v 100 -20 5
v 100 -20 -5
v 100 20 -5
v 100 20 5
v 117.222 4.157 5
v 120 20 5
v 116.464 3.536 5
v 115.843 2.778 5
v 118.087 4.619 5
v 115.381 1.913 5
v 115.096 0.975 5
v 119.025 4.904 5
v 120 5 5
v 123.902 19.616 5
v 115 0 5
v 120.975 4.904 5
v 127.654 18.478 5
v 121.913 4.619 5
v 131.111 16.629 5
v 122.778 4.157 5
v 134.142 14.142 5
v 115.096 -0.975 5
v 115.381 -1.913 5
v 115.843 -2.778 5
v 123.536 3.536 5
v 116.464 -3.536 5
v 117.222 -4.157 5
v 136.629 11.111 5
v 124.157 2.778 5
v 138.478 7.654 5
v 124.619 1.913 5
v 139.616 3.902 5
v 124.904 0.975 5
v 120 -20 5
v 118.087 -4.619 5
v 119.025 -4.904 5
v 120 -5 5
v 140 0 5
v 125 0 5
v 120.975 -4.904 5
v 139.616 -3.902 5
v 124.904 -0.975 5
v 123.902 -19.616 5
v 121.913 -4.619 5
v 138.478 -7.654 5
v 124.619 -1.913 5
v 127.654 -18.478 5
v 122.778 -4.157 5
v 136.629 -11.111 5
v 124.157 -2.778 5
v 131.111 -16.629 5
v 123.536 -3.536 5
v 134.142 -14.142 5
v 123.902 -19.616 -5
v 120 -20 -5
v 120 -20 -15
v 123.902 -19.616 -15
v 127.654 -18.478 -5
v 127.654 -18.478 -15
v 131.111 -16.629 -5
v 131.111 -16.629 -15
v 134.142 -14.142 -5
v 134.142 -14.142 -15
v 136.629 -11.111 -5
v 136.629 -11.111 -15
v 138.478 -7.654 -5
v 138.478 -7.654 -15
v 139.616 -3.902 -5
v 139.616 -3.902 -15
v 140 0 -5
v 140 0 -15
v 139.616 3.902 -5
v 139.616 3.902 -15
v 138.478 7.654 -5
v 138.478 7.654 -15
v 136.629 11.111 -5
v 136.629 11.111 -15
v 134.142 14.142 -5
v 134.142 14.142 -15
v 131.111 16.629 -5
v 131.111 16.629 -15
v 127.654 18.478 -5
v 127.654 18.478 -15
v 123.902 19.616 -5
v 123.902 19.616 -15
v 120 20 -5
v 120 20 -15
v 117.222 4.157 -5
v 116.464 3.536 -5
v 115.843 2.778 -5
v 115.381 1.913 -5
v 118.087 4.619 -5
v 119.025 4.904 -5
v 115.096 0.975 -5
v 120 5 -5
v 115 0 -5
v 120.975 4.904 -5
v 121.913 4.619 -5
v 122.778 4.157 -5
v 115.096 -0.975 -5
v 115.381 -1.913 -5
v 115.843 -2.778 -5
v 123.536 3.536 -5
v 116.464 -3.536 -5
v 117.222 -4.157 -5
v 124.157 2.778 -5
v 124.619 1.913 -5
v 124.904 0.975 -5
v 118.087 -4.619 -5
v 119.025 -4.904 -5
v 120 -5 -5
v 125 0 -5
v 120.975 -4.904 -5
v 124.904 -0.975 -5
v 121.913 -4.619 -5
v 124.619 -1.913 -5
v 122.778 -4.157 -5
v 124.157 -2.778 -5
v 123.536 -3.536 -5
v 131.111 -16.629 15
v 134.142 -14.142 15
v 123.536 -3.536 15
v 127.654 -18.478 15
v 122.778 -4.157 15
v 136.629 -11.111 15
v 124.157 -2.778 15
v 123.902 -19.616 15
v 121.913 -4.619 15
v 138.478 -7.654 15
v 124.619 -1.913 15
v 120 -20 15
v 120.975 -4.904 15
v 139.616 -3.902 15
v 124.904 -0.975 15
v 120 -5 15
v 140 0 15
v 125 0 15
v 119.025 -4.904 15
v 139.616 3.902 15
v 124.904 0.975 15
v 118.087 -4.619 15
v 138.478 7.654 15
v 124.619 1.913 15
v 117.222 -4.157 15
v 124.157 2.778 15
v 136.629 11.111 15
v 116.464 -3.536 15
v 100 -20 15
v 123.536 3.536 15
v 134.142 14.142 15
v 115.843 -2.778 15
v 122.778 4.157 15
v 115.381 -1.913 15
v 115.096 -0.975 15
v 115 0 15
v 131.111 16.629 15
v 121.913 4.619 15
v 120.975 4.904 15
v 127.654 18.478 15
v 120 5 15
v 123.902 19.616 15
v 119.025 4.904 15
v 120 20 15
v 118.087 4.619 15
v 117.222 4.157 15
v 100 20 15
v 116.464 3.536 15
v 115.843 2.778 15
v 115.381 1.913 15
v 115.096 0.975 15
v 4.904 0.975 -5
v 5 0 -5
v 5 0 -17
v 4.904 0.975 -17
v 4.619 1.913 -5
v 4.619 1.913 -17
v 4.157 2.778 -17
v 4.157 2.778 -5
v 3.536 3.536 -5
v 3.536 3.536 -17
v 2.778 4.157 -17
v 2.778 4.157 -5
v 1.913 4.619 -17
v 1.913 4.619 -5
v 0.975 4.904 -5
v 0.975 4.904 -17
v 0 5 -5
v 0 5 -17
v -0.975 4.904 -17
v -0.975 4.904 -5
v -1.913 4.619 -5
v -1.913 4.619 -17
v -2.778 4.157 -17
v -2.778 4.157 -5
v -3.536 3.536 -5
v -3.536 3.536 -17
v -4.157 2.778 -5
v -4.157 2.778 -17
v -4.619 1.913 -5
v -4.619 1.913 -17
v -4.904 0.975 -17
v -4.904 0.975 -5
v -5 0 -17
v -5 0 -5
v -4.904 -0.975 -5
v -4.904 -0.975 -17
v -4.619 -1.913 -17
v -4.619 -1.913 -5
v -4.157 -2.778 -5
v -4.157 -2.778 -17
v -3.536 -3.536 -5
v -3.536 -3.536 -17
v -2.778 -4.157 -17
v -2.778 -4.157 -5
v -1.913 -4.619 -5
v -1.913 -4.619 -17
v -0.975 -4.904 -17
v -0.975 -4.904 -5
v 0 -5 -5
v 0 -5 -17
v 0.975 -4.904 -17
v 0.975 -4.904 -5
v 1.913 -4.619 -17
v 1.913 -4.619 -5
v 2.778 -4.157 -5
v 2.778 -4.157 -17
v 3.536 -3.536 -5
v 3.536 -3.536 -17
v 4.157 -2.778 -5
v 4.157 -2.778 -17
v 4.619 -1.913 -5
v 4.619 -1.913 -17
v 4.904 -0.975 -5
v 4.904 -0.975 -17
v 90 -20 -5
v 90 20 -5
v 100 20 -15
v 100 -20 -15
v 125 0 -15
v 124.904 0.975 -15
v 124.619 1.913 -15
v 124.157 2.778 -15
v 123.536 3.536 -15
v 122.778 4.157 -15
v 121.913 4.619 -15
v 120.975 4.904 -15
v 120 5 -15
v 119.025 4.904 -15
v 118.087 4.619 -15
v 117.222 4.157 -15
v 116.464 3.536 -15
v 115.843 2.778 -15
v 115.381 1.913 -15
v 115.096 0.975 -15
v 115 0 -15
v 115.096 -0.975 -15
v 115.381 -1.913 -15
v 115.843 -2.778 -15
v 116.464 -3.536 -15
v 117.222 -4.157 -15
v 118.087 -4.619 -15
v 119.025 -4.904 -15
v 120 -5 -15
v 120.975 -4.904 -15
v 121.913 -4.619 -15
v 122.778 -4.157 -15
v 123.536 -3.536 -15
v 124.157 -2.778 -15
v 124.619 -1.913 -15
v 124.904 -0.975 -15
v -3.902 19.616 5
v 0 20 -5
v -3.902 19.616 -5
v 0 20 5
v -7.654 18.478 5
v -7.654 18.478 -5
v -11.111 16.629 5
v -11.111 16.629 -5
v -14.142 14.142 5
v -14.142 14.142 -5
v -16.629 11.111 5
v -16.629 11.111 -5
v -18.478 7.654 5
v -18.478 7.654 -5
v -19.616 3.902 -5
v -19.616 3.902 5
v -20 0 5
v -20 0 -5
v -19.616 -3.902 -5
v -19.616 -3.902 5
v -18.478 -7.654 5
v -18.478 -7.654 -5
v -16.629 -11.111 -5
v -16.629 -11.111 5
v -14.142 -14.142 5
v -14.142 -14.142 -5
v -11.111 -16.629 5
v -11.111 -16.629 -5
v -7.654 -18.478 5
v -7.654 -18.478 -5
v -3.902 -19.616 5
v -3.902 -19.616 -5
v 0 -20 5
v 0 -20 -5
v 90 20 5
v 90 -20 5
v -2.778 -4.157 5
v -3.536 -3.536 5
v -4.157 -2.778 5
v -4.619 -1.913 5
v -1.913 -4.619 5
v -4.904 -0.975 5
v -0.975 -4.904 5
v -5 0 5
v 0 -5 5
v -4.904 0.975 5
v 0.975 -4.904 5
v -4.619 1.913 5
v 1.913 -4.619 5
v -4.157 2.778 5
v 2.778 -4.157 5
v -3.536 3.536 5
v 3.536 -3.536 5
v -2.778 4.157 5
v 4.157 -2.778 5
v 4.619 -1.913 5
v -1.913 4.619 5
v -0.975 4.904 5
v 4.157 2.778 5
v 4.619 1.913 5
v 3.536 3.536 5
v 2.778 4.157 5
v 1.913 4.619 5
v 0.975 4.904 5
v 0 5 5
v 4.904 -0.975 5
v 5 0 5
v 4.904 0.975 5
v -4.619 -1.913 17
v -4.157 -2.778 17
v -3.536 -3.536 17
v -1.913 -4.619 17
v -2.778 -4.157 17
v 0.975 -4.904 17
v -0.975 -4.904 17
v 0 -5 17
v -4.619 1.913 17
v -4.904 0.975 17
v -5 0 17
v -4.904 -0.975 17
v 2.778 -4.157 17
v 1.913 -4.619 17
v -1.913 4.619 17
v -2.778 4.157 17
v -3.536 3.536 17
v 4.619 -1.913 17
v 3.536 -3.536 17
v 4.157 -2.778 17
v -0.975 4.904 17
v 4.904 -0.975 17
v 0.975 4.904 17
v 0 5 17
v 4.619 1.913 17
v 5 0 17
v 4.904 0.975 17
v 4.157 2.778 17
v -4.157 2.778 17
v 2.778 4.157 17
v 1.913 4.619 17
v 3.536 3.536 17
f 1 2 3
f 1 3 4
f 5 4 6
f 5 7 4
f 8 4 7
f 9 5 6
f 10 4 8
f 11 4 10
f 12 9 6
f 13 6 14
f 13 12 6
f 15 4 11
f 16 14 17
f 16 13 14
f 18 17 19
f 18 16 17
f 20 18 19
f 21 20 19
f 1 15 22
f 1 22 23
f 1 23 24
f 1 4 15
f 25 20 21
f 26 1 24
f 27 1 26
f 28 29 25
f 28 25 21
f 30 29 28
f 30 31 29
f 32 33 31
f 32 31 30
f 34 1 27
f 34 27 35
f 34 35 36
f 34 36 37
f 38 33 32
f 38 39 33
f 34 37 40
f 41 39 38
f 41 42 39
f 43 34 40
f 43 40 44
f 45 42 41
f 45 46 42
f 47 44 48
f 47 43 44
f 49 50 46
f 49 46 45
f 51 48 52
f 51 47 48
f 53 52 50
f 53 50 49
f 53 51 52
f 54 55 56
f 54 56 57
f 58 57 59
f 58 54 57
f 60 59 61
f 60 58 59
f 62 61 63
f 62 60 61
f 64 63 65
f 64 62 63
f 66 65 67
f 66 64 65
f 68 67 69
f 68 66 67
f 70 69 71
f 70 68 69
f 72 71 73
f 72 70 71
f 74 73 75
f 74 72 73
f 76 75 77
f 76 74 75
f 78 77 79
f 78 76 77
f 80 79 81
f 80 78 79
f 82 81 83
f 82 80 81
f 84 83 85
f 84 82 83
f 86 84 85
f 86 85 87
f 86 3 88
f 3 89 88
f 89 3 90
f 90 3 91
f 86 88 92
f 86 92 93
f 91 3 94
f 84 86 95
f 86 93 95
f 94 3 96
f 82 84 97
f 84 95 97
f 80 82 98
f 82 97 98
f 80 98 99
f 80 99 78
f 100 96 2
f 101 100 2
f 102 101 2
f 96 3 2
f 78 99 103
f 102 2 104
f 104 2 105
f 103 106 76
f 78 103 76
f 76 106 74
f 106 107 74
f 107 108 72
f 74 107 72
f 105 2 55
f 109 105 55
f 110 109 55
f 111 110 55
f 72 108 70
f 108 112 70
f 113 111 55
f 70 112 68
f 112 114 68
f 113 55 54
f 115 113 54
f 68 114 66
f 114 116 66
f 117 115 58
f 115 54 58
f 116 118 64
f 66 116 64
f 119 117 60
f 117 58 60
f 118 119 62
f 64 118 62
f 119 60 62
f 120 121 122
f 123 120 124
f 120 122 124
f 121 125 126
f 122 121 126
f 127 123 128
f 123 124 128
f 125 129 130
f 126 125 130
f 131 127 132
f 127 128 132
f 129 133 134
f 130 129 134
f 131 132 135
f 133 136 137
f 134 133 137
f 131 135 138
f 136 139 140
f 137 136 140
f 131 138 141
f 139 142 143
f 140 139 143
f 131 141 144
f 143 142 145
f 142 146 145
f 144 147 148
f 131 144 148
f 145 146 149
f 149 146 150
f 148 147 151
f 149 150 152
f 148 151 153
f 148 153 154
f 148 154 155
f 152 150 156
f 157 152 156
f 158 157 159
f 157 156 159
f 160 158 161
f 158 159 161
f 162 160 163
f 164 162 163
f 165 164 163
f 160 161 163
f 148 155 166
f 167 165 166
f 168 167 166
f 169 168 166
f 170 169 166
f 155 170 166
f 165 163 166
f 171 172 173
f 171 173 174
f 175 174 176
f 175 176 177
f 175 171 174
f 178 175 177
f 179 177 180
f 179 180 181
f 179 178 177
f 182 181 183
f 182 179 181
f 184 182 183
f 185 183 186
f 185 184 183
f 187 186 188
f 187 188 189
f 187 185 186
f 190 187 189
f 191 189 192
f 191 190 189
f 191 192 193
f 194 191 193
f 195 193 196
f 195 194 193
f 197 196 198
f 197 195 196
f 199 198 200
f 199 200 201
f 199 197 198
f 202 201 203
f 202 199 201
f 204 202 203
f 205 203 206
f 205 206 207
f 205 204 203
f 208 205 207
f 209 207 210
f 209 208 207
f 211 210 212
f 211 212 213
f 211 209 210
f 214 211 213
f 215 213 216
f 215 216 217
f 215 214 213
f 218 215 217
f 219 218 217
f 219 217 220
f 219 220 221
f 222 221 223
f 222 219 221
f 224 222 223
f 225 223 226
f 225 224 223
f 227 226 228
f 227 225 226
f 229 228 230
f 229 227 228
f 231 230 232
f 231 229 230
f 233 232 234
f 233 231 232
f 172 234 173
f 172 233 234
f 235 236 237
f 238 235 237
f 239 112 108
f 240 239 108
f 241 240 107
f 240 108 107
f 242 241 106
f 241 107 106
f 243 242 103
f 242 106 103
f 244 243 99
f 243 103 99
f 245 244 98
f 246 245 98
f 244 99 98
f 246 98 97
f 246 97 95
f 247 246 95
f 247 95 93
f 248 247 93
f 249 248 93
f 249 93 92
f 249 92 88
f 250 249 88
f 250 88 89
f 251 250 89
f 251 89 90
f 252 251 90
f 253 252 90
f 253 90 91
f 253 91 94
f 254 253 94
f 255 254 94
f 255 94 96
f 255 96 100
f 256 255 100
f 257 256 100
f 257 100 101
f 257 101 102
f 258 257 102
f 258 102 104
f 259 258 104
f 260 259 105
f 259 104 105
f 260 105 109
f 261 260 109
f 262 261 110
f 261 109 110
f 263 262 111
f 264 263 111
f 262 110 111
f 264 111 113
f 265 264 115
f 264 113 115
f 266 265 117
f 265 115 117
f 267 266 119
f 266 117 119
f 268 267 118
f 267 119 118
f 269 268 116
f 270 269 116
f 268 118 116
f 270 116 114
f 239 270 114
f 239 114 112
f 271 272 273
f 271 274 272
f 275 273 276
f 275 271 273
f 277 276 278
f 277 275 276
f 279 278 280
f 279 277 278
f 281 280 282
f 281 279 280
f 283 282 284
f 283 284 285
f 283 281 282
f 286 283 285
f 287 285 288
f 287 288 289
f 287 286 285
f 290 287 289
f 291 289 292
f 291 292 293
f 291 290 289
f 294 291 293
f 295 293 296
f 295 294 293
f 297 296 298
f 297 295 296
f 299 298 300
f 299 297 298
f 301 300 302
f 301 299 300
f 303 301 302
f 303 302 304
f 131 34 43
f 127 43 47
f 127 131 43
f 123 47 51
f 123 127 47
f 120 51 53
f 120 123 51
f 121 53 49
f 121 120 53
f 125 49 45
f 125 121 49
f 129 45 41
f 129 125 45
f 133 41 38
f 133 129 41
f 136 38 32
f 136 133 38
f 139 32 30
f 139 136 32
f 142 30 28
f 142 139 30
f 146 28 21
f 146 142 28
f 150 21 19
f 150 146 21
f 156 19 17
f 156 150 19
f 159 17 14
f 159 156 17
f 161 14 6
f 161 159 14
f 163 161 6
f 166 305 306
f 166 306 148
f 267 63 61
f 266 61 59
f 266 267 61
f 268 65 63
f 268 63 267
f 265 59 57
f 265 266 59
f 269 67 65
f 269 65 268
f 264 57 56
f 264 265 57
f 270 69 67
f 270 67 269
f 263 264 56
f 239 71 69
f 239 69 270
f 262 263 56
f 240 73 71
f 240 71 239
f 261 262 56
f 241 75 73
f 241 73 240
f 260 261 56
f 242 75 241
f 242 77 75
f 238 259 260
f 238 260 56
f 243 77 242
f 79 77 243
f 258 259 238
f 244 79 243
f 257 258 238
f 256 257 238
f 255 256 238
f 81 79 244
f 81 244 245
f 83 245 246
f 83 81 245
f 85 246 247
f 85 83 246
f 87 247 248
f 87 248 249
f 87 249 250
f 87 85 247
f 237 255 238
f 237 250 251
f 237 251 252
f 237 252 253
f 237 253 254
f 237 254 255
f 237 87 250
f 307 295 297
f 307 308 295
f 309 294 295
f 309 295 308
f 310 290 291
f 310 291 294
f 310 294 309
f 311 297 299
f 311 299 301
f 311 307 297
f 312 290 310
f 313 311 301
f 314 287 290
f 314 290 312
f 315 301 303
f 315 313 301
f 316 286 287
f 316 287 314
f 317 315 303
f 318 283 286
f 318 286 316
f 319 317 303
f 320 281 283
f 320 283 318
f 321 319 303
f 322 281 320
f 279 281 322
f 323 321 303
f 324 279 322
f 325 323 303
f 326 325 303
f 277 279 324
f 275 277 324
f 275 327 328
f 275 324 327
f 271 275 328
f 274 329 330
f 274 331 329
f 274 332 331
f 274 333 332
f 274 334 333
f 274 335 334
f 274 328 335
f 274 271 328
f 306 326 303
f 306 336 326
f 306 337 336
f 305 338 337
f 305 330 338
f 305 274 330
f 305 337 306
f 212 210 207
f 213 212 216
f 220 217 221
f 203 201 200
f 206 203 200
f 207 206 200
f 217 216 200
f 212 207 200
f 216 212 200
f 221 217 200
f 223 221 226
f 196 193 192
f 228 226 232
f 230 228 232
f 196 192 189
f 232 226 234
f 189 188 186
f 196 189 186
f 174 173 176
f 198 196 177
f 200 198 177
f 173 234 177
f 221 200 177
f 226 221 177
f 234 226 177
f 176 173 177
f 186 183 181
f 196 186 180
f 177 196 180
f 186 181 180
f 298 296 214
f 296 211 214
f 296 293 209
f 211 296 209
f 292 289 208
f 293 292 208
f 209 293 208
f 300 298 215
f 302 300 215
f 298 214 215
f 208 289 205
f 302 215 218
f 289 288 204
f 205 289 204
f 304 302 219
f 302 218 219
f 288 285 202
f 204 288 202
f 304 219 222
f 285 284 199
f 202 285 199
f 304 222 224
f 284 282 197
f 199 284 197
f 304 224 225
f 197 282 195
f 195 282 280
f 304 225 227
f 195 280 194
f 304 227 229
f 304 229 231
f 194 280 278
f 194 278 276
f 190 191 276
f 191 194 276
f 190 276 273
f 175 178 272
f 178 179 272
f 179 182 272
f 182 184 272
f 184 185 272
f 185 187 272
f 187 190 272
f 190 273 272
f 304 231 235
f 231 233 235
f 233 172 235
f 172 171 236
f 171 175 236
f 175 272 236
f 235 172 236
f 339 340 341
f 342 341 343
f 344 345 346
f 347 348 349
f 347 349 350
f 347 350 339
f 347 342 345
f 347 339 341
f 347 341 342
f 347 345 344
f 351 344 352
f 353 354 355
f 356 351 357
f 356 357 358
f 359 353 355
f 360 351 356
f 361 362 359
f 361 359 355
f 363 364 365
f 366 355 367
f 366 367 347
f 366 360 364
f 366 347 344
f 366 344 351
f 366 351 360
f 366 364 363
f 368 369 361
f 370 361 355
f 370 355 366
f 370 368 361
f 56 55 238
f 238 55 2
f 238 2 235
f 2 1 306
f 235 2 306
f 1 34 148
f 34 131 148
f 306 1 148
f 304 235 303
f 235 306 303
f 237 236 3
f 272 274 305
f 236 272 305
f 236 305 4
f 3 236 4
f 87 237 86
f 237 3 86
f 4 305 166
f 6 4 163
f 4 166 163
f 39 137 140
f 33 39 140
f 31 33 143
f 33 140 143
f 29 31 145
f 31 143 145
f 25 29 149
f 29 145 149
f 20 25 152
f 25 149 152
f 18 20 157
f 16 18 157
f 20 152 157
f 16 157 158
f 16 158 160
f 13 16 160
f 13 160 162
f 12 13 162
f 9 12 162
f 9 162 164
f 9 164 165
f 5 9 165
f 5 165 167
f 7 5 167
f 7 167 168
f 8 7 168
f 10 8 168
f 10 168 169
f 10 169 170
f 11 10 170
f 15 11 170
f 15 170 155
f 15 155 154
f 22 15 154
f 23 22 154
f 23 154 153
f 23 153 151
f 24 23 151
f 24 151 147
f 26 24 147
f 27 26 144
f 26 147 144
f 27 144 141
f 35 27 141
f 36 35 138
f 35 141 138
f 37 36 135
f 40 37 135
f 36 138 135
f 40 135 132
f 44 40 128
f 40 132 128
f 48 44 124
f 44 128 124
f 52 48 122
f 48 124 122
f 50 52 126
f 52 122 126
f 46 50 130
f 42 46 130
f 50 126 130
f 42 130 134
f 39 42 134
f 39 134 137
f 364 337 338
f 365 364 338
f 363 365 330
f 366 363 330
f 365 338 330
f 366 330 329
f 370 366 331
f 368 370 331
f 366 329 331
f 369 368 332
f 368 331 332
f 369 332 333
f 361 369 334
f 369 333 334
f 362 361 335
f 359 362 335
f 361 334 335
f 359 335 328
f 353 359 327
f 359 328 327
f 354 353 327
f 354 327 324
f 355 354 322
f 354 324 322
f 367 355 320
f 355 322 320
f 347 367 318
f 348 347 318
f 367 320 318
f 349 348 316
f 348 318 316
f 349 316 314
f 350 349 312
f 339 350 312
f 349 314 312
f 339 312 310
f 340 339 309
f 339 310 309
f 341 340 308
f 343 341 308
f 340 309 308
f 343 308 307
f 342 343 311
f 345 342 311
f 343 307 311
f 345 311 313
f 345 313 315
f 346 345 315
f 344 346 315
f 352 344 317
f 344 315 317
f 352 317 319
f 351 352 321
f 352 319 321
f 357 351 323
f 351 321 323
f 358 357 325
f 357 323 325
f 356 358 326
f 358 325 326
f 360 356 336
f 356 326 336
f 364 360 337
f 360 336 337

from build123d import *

# Parameters (mm, degrees)
PAD_DEPTH       = 5
SKETCH001_R     = 5
PAD001_DEPTH    = 12
PAD002_DEPTH    = 10
SKETCH003_W     = 40
SKETCH003_H     = 10
POCKET_DEPTH    = 40
POCKET001_DEPTH = 40
SKETCH005_R     = 5
POCKET002_DEPTH = 30


with BuildPart() as part:
    # Sketch → Pad (new body, symmetric)
    with BuildSketch(Plane.XY):
        with BuildLine():
            ThreePointArc((0, 20), (-20, 0), (0, -20))
            Line((0, -20), (119.999969, -20))
            ThreePointArc((119.999969, -20), (140, -1.6e-05), (120, 20))
            Line((0, 20), (120, 20))
        make_face()
    extrude(amount=PAD_DEPTH, both=True)

    # Sketch001 (on Face6 of Pad) → Pad001 (join)
    with BuildSketch(Plane.XY.offset(5)):
        Circle(SKETCH001_R)
    pad001 = extrude(amount=PAD001_DEPTH)

    # Sketch002 (on Face5 of Pad001) → Pad002 (join)
    with BuildSketch(Plane.XY.offset(5)):
        with BuildLine():
            Line((90, 20), (119.999998, 20))
            ThreePointArc((120.000041, -20), (140, 2.1e-05), (119.999998, 20))
            Line((120.000041, -20), (90, -20))
            Line((90, -20), (90, 20))
        make_face()
    pad002 = extrude(amount=PAD002_DEPTH)

    # Mirrored: Pad002 across XY
    add(pad002.mirror(Plane.XY))

    # Mirrored001: Pad001 across XY
    add(pad001.mirror(Plane.XY))

    # Sketch003 (on Face3 of Mirrored001) → Pocket (cut, symmetric)
    with BuildSketch(Plane.XZ.offset(20)):
        with Locations((120, 0)):
            Rectangle(SKETCH003_W, SKETCH003_H)
    extrude(amount=POCKET_DEPTH, both=True, mode=Mode.SUBTRACT)

    # Sketch004 (on Face10 of Pocket) → Pocket001 (cut)
    with BuildSketch(Plane.XZ.offset(20)):
        Polygon((90, 15), (90, 5), (100, 15), align=None)
    pocket001 = extrude(amount=-POCKET001_DEPTH, mode=Mode.SUBTRACT)

    # Mirrored002: Pocket001 across XY
    add(pocket001.mirror(Plane.XY), mode=Mode.SUBTRACT)

    # Sketch005 (on Face20 of Mirrored002) → Pocket002 (cut)
    with BuildSketch(Plane.XY.offset(15)):
        with Locations((120, 0)):
            Circle(SKETCH005_R)
    extrude(amount=-POCKET002_DEPTH, mode=Mode.SUBTRACT)


solid = part.part
